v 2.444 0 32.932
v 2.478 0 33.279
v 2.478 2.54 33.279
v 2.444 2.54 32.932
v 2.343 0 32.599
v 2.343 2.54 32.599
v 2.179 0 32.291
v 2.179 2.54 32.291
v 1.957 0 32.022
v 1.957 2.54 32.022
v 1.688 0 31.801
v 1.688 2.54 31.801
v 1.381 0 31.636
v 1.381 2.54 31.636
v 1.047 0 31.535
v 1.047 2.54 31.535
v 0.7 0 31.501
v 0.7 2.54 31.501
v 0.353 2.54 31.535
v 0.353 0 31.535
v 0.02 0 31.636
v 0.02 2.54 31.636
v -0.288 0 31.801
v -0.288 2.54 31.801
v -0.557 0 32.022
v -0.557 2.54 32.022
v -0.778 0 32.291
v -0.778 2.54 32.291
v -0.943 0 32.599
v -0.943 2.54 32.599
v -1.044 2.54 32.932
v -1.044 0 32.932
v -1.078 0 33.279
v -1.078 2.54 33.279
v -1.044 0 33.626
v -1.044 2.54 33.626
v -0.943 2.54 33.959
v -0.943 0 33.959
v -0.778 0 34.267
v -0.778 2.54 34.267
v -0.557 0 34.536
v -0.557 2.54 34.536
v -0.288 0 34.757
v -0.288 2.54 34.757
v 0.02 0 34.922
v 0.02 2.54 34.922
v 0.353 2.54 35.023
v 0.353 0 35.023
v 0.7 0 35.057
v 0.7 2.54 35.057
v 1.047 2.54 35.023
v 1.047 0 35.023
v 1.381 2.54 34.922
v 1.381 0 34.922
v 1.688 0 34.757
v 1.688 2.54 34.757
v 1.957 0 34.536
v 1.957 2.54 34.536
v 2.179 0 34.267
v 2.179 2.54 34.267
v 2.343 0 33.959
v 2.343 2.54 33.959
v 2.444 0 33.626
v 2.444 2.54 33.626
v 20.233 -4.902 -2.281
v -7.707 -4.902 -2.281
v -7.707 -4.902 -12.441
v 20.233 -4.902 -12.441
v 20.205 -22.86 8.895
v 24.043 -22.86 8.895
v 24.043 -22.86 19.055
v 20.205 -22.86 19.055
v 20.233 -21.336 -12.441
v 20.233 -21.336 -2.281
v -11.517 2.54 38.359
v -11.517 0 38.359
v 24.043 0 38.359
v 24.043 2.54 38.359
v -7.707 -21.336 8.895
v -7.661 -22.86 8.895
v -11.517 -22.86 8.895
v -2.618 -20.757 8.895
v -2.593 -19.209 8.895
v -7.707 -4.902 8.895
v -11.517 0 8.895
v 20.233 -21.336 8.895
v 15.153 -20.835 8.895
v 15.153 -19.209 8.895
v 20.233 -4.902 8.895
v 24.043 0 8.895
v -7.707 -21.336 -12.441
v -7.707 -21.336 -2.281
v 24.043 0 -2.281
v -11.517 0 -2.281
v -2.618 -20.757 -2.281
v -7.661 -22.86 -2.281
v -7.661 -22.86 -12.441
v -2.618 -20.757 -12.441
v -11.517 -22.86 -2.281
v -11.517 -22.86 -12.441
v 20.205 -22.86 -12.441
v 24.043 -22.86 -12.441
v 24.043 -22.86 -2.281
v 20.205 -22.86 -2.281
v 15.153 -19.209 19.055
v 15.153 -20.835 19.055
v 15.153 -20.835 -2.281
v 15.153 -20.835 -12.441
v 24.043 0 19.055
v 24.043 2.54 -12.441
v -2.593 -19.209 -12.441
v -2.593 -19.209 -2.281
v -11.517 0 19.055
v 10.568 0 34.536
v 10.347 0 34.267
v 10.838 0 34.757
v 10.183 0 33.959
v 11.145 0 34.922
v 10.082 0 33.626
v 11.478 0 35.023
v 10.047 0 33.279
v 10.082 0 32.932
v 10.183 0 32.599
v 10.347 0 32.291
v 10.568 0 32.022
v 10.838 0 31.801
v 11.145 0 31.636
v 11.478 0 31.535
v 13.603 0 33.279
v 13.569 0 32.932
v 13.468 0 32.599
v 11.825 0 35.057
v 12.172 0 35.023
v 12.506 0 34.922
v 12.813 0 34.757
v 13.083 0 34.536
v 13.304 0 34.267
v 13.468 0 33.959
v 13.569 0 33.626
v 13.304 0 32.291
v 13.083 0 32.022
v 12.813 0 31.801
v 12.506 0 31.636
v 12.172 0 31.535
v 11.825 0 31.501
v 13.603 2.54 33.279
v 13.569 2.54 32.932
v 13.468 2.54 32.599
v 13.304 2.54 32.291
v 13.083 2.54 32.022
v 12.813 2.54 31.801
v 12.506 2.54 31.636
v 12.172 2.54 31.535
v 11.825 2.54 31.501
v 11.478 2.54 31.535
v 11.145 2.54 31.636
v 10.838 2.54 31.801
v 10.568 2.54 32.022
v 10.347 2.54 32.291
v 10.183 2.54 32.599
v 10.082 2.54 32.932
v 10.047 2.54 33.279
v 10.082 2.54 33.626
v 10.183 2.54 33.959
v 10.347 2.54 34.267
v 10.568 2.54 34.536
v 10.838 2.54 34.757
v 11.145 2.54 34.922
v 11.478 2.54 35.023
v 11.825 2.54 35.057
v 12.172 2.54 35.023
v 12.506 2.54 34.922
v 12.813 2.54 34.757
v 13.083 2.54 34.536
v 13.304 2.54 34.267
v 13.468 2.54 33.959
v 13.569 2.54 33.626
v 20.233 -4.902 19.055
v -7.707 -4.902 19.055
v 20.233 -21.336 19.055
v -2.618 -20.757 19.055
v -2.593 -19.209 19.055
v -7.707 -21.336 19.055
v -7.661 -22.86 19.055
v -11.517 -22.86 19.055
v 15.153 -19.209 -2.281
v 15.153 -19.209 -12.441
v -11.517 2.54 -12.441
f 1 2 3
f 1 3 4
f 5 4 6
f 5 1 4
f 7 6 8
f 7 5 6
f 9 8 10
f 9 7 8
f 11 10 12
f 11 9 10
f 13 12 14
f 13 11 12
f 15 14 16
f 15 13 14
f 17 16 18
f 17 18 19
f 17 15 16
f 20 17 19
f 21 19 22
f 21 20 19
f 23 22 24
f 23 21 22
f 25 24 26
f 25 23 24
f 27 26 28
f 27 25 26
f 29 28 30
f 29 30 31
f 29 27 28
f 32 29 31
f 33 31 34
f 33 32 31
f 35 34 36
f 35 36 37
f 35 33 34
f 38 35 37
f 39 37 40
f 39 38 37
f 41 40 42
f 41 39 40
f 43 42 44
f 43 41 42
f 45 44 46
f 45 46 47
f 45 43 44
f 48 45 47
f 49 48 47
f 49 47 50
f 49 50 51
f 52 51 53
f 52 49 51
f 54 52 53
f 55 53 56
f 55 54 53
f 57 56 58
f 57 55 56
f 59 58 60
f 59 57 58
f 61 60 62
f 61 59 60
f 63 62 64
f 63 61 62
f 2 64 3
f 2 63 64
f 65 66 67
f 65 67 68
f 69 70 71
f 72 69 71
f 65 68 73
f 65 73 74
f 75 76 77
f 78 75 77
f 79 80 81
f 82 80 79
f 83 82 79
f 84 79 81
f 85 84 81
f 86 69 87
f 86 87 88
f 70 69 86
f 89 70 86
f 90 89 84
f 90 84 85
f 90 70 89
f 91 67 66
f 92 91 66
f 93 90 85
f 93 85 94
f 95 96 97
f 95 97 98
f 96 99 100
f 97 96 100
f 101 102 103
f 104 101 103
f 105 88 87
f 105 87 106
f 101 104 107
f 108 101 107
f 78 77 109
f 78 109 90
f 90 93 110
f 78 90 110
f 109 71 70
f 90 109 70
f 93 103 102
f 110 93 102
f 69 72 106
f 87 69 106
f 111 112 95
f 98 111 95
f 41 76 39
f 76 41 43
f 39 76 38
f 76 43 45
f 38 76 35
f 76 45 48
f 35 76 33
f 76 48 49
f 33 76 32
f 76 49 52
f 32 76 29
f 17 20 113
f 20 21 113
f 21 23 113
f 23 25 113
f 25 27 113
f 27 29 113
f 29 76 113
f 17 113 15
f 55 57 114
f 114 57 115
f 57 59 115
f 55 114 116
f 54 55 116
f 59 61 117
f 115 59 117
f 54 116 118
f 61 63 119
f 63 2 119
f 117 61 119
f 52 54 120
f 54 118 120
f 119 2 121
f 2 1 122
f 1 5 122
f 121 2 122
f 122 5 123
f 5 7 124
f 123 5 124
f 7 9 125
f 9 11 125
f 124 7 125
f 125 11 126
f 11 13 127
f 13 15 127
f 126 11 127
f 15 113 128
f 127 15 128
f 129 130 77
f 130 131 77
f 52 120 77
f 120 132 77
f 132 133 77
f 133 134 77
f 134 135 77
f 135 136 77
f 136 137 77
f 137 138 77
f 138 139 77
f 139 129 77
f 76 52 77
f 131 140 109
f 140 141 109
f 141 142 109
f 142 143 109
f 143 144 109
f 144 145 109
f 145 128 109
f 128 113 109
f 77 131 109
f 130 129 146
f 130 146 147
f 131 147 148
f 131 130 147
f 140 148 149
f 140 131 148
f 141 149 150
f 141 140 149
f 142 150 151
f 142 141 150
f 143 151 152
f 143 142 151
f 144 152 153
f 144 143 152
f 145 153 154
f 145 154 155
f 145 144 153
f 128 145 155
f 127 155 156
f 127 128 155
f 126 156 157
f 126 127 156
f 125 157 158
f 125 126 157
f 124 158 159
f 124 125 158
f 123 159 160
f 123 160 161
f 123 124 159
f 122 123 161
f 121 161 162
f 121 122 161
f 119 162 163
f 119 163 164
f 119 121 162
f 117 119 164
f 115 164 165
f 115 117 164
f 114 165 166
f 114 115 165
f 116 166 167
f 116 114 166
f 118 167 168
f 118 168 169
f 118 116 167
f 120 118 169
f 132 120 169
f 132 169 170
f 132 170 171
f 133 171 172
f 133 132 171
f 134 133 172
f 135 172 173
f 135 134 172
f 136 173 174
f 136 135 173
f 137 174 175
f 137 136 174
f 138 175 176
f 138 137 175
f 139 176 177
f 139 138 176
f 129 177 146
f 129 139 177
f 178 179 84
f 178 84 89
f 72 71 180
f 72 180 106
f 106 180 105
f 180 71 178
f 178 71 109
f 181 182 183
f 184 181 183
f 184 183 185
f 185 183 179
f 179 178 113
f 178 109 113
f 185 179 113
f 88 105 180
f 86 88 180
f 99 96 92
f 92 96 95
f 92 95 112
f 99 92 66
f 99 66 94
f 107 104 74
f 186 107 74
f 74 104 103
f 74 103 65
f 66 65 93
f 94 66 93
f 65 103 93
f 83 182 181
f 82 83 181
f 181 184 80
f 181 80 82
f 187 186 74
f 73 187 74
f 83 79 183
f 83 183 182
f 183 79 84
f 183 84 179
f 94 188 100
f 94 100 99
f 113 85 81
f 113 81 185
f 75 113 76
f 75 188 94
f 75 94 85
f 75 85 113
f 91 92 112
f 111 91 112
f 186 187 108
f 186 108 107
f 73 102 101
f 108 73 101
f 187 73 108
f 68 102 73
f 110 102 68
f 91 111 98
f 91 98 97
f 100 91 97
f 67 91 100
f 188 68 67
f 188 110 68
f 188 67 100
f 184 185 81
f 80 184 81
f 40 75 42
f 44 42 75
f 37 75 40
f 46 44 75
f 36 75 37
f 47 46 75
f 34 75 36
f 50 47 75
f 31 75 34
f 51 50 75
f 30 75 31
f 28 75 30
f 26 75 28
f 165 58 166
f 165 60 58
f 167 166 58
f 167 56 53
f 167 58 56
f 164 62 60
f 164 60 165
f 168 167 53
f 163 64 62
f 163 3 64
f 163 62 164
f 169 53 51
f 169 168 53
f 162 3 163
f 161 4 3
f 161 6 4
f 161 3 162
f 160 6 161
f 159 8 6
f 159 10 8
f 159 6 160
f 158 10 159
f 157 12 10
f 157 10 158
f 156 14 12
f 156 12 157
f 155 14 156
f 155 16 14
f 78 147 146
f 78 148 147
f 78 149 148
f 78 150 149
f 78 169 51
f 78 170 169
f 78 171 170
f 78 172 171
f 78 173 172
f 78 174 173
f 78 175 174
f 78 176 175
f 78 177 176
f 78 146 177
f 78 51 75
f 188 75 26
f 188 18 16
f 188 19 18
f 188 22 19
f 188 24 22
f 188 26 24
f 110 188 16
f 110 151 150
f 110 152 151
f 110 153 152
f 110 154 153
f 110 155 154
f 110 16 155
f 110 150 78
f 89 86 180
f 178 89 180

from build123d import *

# Parameters (mm, degrees)
SKETCH3_W           = 35.56
SKETCH3_H           = 50.8
SKETCH3_R           = 1.778
BOSS_EXTRUDE3_DEPTH = 2.54
SKETCH4_W           = 3.81
SKETCH4_H           = 36.576
BOSS_EXTRUDE4_DEPTH = 22.86
SKETCH5_W           = 36.576
SKETCH5_H           = 1.524
BOSS_EXTRUDE5_DEPTH = 5.08
SKETCH6_W           = 36.576
SKETCH6_H           = 1.524
BOSS_EXTRUDE6_DEPTH = 5.08
SKETCH7_W           = 35.56
SKETCH7_H           = 22.86
CUT_EXTRUDE1_DEPTH  = 5.08
SKETCH11_W          = 35.56
SKETCH11_H          = 31.496
BOSS_EXTRUDE7_DEPTH = 4.9022
BOSS_EXTRUDE8_DEPTH = 31.496
SKETCH8_W           = 11.176
SKETCH8_H           = 22.86
CUT_EXTRUDE2_DEPTH  = 36.56
CUT_EXTRUDE3_DEPTH  = 32.496


with BuildPart() as part:
    # Sketch3 → Boss-Extrude3 (new body)
    with BuildSketch(Plane(origin=(0, 0, 0), x_dir=(1, 0, 0), z_dir=(0, 1, 0))):
        with Locations((6.262748092, -12.959016216)):
            Rectangle(SKETCH3_W, SKETCH3_H)
        with Locations((0.700148092, -33.279016216)):
            Circle(SKETCH3_R, mode=Mode.SUBTRACT)
        with Locations((11.825348092, -33.279016216)):
            Circle(SKETCH3_R, mode=Mode.SUBTRACT)
    extrude(amount=BOSS_EXTRUDE3_DEPTH)

    # Sketch4 → Boss-Extrude4 (add)
    with BuildSketch(Plane.XZ):
        with Locations((-9.612251908, 5.847016216)):
            Rectangle(SKETCH4_W, SKETCH4_H)
        with Locations((22.137748092, 5.847016216)):
            Rectangle(SKETCH4_W, SKETCH4_H)
    extrude(amount=BOSS_EXTRUDE4_DEPTH)

    # Sketch5 → Boss-Extrude5 (add)
    with BuildSketch(Plane(origin=(-7.707251908, 0, 0), x_dir=(0, 0, -1), z_dir=(1, 0, 0))):
        with Locations((-5.847016216, -22.098)):
            Rectangle(SKETCH5_W, SKETCH5_H)
    extrude(amount=BOSS_EXTRUDE5_DEPTH)

    # Sketch6 → Boss-Extrude6 (add)
    with BuildSketch(Plane.ZY.offset(-20.232748092)):
        with Locations((5.847016216, -22.098)):
            Rectangle(SKETCH6_W, SKETCH6_H)
    extrude(amount=BOSS_EXTRUDE6_DEPTH)

    # Sketch7 → Cut-Extrude1 (cut)
    with BuildSketch(Plane.XY.offset(24.135016216)):
        with Locations((6.262748092, -11.43)):
            Rectangle(SKETCH7_W, SKETCH7_H)
    extrude(amount=-CUT_EXTRUDE1_DEPTH, mode=Mode.SUBTRACT)

    # Sketch11 → Boss-Extrude7 (add)
    with BuildSketch(Plane.XZ):
        with Locations((6.262748092, 3.307016216)):
            Rectangle(SKETCH11_W, SKETCH11_H)
    extrude(amount=BOSS_EXTRUDE7_DEPTH)

    # Sketch12 → Boss-Extrude8 (add)
    with BuildSketch(Plane.XY.offset(19.055016216)):
        Polygon((-7.707251908, -21.336), (-2.593407451, -19.20881978), (-2.627251908, -21.336), align=None)
        Polygon((15.152748092, -21.336), (15.152748092, -19.20881978), (20.232748092, -21.336), align=None)
    extrude(amount=-BOSS_EXTRUDE8_DEPTH)

    # Sketch8 → Cut-Extrude2 (cut, through all)
    with BuildSketch(Plane(origin=(24.042748092, 0, 0), x_dir=(0, 0, -1), z_dir=(1, 0, 0))):
        with Locations((-3.307016216, -11.43)):
            Rectangle(SKETCH8_W, SKETCH8_H)
    extrude(amount=-CUT_EXTRUDE2_DEPTH, mode=Mode.SUBTRACT)

    # Sketch13 → Cut-Extrude3 (cut, through all)
    with BuildSketch(Plane.XY.offset(19.055016216)):
        Polygon((-7.660745747, -22.86), (-2.618035473, -20.756731792), (-2.627251908, -22.86), align=None)
        Polygon((15.152748092, -22.86), (20.204845905, -22.86), (15.152748092, -20.834602636), align=None)
    extrude(amount=-CUT_EXTRUDE3_DEPTH, mode=Mode.SUBTRACT)


solid = part.part
